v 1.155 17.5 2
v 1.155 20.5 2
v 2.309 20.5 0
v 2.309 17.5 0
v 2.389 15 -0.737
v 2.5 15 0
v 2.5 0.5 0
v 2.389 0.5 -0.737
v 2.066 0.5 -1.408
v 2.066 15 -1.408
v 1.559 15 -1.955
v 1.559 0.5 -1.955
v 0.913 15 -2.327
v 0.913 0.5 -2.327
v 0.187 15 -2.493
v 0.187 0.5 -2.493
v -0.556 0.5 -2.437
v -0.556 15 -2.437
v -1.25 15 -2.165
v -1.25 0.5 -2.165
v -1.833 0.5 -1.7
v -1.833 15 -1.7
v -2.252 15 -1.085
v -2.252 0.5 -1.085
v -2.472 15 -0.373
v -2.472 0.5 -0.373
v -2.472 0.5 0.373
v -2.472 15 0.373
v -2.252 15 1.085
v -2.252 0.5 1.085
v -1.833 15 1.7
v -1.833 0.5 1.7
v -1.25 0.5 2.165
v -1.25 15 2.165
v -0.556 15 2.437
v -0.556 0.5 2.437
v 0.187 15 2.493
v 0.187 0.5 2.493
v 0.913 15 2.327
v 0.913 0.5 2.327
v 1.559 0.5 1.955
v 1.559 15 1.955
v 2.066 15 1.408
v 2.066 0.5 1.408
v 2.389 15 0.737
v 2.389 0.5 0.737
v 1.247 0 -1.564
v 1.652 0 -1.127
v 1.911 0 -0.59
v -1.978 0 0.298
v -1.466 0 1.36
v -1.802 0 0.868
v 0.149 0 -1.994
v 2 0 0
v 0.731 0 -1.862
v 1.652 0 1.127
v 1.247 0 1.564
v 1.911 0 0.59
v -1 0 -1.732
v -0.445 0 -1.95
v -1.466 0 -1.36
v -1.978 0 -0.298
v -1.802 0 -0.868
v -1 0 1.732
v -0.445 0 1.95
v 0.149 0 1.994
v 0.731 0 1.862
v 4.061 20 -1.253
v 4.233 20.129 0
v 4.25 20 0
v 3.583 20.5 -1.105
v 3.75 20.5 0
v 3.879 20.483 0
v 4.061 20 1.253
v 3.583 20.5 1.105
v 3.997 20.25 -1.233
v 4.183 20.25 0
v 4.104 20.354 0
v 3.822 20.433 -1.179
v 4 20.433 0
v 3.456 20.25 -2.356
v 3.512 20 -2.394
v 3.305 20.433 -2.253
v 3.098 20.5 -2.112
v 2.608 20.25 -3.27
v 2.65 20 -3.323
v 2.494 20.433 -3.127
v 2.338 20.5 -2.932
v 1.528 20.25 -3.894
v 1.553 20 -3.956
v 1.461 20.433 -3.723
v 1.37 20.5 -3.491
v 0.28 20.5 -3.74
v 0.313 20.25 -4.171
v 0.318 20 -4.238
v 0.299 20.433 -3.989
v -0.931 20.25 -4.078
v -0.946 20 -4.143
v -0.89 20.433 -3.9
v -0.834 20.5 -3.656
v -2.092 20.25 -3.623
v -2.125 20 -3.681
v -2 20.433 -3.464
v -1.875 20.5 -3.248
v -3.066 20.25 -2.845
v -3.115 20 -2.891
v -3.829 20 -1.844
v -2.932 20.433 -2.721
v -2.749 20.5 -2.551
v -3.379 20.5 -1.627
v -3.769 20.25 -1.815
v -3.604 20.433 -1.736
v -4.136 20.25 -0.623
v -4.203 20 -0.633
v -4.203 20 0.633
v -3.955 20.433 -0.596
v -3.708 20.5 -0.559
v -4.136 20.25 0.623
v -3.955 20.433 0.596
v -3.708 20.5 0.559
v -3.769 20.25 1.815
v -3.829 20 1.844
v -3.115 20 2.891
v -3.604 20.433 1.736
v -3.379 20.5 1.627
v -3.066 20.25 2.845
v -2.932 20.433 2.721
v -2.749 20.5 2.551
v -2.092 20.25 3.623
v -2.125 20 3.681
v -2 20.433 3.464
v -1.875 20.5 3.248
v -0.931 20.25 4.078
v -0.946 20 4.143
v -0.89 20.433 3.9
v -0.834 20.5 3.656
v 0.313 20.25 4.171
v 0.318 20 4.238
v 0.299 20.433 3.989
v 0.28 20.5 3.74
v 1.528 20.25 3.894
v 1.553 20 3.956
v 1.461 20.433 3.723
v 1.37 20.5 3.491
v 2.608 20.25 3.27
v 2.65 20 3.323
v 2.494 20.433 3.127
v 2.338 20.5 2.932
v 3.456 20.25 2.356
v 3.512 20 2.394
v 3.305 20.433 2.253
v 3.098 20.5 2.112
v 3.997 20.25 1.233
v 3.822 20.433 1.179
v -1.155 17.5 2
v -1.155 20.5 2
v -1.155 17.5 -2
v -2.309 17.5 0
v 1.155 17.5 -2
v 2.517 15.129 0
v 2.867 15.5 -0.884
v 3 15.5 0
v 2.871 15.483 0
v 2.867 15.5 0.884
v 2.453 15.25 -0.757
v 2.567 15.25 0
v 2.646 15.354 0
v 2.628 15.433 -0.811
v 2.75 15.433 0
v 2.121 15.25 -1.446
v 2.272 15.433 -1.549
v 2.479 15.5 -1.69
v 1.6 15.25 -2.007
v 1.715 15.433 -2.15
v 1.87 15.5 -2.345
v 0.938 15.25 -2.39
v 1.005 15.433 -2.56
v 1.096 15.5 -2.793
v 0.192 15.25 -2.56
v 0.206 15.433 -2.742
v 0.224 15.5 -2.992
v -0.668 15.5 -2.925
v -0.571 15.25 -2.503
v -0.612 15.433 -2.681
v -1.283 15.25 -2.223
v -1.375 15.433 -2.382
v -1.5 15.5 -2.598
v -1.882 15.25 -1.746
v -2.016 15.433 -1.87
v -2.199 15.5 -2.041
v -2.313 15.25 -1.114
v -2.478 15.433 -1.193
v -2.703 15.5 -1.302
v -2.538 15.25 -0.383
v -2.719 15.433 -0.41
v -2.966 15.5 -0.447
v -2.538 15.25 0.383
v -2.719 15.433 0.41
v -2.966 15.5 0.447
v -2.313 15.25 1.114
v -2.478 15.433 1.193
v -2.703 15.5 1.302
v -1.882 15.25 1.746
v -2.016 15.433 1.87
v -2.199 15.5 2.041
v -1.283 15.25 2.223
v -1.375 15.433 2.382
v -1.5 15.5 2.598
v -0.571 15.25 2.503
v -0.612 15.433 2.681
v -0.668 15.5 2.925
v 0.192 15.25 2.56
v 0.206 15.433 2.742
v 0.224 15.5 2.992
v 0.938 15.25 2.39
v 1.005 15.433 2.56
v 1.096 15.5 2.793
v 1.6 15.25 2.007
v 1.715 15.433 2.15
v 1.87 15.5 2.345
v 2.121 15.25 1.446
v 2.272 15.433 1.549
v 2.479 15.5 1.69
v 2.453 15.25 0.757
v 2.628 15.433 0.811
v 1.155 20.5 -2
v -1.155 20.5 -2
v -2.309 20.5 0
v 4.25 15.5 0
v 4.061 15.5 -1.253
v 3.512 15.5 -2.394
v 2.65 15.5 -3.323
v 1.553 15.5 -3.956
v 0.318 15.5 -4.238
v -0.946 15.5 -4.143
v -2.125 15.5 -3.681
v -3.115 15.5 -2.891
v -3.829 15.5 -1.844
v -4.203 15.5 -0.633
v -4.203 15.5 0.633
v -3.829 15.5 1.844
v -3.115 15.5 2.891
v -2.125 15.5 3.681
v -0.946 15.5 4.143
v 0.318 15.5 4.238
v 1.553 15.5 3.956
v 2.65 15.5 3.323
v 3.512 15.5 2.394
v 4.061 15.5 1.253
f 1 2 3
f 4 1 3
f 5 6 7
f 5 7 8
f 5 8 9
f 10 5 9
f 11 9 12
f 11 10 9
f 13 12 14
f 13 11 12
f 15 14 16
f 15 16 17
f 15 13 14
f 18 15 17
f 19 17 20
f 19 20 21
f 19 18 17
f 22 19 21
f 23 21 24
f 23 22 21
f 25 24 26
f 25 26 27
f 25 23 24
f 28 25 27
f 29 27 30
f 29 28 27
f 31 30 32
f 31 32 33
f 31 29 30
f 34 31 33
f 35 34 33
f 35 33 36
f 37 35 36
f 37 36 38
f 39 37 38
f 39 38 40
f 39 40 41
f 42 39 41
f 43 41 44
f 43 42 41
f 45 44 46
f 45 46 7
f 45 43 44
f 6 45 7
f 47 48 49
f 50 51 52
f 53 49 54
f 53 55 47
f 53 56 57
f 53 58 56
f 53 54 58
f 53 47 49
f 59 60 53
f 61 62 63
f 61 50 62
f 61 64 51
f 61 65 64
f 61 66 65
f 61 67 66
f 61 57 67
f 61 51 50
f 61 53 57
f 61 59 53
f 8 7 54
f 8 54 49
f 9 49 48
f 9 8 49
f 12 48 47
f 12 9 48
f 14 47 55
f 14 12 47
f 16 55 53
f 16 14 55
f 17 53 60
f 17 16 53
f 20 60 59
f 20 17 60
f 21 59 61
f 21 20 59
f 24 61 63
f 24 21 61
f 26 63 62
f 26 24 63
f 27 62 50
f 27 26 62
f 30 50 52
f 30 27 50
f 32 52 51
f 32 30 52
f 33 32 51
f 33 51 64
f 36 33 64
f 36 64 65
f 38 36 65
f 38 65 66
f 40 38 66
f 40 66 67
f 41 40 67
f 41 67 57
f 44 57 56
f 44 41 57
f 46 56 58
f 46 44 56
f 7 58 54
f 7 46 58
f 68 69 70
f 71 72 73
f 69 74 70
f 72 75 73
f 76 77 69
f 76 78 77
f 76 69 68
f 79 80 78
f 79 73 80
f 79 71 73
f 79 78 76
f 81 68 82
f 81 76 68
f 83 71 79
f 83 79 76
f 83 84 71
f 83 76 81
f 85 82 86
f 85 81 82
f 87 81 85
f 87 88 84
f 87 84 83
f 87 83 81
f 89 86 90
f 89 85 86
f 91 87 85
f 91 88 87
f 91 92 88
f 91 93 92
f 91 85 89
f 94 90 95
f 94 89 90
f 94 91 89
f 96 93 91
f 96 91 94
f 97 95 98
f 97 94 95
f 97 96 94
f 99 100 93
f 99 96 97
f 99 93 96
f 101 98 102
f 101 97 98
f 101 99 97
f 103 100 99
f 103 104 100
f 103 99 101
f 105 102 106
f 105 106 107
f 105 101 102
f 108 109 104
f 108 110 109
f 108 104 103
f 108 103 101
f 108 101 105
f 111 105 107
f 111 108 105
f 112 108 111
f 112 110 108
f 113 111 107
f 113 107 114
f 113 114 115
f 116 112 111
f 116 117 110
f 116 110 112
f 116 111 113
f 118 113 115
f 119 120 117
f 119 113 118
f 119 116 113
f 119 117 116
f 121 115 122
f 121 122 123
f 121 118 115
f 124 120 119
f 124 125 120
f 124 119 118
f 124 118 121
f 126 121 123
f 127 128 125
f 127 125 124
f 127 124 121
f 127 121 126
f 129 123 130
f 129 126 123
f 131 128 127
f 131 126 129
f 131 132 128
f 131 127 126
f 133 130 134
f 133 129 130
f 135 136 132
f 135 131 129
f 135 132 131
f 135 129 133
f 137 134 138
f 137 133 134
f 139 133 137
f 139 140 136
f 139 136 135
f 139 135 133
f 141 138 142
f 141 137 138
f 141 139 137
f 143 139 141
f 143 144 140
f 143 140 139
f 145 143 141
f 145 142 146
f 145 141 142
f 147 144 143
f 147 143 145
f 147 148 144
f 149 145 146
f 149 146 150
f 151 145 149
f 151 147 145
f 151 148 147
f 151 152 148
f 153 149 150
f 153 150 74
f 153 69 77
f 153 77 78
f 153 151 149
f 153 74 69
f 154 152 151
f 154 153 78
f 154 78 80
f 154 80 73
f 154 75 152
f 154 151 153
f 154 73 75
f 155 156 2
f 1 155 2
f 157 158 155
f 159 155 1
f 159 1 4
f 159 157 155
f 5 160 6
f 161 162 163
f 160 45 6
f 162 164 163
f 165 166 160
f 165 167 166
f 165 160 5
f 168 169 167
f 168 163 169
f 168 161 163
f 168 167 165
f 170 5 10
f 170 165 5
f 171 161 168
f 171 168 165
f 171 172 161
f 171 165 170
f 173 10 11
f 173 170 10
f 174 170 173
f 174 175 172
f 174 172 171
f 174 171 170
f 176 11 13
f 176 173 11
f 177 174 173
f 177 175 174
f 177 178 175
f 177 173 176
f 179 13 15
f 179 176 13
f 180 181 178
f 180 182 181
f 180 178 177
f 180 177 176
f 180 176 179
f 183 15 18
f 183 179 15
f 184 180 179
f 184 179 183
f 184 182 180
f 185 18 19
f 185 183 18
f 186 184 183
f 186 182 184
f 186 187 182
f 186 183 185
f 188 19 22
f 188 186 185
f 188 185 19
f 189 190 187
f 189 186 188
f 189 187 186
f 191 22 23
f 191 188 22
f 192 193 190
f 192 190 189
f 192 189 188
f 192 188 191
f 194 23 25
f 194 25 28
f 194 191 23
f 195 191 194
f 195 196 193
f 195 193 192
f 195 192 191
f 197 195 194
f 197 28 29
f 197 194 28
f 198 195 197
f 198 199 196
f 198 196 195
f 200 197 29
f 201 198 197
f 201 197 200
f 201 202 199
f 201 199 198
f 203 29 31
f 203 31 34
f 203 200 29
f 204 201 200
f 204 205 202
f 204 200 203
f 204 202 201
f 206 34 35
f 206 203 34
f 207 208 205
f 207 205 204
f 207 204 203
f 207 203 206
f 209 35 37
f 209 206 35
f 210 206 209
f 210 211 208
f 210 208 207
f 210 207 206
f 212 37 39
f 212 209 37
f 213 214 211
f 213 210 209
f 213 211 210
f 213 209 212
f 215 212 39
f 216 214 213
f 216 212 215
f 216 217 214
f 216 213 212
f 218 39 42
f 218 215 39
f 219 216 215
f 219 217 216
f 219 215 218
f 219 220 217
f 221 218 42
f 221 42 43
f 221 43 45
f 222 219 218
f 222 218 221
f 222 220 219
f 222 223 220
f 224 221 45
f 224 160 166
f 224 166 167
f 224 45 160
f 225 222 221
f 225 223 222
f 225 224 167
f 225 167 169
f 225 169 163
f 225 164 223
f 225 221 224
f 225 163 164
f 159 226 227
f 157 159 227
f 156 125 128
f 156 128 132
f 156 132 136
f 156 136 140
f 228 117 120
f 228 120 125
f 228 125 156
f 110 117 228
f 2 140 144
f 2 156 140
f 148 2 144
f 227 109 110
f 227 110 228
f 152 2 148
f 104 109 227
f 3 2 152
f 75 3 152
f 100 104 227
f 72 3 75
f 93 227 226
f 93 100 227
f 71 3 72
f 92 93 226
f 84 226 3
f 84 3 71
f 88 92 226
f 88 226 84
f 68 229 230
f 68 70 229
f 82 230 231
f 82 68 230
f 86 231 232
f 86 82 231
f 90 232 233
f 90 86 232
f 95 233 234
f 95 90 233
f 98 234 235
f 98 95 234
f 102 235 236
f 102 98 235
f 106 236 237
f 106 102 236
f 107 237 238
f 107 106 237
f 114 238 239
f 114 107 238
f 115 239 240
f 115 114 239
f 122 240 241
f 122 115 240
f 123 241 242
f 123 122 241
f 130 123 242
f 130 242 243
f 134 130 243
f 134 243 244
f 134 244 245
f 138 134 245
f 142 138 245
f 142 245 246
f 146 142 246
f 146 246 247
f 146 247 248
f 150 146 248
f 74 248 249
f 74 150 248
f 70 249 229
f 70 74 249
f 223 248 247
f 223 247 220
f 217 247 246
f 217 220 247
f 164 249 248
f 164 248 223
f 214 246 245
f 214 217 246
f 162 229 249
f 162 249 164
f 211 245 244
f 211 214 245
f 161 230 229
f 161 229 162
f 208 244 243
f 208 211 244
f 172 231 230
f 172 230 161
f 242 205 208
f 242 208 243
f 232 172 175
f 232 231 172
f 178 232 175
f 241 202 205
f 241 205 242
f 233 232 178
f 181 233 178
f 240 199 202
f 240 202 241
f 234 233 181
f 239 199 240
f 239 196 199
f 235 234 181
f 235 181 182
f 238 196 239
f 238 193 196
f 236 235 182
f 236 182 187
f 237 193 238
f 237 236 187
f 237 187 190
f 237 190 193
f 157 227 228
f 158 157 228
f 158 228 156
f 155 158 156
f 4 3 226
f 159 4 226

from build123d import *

# Parameters (mm, degrees)
CHAMFER_1_SIZE      = 0.5
CUT_EXTRUDE_1_DEPTH = 3


with BuildPart() as part:
    # Эскиз1 → Повернуть1 (revolve)
    with BuildSketch(Plane.XY):
        with BuildLine():
            Line((0, 0), (2.5, 0))
            Line((2.5, 0), (2.5, 15))
            ThreePointArc((2.5, 15), (2.646446609, 15.353553391), (3, 15.5))
            Line((3, 15.5), (4.25, 15.5))
            Line((4.25, 15.5), (4.25, 20))
            ThreePointArc((4.25, 20), (4.103553391, 20.353553391), (3.75, 20.5))
            Line((3.75, 20.5), (0, 20.5))
            Line((0, 20.5), (0, 0))
        make_face()
    revolve(axis=Axis((0, -169.015508263, 0), (0, 1, 0)))

    # Фаска1
    chamfer_1_edges = [part.edges().sort_by_distance(p)[0] for p in [
        (-2.5, 0, 0),
    ]]
    chamfer(chamfer_1_edges, length=CHAMFER_1_SIZE)

    # Эскиз2 → Вырез-Вытянуть1 (cut)
    with BuildSketch(Plane(origin=(0, 20.5, 0), x_dir=(1, 0, 0), z_dir=(0, 1, 0))):
        Polygon((2.309401077, 0), (1.154700538, 2), (-1.154700538, 2), (-2.309401077, 0), (-1.154700538, -2), (1.154700538, -2), align=None)
    extrude(amount=-CUT_EXTRUDE_1_DEPTH, mode=Mode.SUBTRACT)


solid = part.part
